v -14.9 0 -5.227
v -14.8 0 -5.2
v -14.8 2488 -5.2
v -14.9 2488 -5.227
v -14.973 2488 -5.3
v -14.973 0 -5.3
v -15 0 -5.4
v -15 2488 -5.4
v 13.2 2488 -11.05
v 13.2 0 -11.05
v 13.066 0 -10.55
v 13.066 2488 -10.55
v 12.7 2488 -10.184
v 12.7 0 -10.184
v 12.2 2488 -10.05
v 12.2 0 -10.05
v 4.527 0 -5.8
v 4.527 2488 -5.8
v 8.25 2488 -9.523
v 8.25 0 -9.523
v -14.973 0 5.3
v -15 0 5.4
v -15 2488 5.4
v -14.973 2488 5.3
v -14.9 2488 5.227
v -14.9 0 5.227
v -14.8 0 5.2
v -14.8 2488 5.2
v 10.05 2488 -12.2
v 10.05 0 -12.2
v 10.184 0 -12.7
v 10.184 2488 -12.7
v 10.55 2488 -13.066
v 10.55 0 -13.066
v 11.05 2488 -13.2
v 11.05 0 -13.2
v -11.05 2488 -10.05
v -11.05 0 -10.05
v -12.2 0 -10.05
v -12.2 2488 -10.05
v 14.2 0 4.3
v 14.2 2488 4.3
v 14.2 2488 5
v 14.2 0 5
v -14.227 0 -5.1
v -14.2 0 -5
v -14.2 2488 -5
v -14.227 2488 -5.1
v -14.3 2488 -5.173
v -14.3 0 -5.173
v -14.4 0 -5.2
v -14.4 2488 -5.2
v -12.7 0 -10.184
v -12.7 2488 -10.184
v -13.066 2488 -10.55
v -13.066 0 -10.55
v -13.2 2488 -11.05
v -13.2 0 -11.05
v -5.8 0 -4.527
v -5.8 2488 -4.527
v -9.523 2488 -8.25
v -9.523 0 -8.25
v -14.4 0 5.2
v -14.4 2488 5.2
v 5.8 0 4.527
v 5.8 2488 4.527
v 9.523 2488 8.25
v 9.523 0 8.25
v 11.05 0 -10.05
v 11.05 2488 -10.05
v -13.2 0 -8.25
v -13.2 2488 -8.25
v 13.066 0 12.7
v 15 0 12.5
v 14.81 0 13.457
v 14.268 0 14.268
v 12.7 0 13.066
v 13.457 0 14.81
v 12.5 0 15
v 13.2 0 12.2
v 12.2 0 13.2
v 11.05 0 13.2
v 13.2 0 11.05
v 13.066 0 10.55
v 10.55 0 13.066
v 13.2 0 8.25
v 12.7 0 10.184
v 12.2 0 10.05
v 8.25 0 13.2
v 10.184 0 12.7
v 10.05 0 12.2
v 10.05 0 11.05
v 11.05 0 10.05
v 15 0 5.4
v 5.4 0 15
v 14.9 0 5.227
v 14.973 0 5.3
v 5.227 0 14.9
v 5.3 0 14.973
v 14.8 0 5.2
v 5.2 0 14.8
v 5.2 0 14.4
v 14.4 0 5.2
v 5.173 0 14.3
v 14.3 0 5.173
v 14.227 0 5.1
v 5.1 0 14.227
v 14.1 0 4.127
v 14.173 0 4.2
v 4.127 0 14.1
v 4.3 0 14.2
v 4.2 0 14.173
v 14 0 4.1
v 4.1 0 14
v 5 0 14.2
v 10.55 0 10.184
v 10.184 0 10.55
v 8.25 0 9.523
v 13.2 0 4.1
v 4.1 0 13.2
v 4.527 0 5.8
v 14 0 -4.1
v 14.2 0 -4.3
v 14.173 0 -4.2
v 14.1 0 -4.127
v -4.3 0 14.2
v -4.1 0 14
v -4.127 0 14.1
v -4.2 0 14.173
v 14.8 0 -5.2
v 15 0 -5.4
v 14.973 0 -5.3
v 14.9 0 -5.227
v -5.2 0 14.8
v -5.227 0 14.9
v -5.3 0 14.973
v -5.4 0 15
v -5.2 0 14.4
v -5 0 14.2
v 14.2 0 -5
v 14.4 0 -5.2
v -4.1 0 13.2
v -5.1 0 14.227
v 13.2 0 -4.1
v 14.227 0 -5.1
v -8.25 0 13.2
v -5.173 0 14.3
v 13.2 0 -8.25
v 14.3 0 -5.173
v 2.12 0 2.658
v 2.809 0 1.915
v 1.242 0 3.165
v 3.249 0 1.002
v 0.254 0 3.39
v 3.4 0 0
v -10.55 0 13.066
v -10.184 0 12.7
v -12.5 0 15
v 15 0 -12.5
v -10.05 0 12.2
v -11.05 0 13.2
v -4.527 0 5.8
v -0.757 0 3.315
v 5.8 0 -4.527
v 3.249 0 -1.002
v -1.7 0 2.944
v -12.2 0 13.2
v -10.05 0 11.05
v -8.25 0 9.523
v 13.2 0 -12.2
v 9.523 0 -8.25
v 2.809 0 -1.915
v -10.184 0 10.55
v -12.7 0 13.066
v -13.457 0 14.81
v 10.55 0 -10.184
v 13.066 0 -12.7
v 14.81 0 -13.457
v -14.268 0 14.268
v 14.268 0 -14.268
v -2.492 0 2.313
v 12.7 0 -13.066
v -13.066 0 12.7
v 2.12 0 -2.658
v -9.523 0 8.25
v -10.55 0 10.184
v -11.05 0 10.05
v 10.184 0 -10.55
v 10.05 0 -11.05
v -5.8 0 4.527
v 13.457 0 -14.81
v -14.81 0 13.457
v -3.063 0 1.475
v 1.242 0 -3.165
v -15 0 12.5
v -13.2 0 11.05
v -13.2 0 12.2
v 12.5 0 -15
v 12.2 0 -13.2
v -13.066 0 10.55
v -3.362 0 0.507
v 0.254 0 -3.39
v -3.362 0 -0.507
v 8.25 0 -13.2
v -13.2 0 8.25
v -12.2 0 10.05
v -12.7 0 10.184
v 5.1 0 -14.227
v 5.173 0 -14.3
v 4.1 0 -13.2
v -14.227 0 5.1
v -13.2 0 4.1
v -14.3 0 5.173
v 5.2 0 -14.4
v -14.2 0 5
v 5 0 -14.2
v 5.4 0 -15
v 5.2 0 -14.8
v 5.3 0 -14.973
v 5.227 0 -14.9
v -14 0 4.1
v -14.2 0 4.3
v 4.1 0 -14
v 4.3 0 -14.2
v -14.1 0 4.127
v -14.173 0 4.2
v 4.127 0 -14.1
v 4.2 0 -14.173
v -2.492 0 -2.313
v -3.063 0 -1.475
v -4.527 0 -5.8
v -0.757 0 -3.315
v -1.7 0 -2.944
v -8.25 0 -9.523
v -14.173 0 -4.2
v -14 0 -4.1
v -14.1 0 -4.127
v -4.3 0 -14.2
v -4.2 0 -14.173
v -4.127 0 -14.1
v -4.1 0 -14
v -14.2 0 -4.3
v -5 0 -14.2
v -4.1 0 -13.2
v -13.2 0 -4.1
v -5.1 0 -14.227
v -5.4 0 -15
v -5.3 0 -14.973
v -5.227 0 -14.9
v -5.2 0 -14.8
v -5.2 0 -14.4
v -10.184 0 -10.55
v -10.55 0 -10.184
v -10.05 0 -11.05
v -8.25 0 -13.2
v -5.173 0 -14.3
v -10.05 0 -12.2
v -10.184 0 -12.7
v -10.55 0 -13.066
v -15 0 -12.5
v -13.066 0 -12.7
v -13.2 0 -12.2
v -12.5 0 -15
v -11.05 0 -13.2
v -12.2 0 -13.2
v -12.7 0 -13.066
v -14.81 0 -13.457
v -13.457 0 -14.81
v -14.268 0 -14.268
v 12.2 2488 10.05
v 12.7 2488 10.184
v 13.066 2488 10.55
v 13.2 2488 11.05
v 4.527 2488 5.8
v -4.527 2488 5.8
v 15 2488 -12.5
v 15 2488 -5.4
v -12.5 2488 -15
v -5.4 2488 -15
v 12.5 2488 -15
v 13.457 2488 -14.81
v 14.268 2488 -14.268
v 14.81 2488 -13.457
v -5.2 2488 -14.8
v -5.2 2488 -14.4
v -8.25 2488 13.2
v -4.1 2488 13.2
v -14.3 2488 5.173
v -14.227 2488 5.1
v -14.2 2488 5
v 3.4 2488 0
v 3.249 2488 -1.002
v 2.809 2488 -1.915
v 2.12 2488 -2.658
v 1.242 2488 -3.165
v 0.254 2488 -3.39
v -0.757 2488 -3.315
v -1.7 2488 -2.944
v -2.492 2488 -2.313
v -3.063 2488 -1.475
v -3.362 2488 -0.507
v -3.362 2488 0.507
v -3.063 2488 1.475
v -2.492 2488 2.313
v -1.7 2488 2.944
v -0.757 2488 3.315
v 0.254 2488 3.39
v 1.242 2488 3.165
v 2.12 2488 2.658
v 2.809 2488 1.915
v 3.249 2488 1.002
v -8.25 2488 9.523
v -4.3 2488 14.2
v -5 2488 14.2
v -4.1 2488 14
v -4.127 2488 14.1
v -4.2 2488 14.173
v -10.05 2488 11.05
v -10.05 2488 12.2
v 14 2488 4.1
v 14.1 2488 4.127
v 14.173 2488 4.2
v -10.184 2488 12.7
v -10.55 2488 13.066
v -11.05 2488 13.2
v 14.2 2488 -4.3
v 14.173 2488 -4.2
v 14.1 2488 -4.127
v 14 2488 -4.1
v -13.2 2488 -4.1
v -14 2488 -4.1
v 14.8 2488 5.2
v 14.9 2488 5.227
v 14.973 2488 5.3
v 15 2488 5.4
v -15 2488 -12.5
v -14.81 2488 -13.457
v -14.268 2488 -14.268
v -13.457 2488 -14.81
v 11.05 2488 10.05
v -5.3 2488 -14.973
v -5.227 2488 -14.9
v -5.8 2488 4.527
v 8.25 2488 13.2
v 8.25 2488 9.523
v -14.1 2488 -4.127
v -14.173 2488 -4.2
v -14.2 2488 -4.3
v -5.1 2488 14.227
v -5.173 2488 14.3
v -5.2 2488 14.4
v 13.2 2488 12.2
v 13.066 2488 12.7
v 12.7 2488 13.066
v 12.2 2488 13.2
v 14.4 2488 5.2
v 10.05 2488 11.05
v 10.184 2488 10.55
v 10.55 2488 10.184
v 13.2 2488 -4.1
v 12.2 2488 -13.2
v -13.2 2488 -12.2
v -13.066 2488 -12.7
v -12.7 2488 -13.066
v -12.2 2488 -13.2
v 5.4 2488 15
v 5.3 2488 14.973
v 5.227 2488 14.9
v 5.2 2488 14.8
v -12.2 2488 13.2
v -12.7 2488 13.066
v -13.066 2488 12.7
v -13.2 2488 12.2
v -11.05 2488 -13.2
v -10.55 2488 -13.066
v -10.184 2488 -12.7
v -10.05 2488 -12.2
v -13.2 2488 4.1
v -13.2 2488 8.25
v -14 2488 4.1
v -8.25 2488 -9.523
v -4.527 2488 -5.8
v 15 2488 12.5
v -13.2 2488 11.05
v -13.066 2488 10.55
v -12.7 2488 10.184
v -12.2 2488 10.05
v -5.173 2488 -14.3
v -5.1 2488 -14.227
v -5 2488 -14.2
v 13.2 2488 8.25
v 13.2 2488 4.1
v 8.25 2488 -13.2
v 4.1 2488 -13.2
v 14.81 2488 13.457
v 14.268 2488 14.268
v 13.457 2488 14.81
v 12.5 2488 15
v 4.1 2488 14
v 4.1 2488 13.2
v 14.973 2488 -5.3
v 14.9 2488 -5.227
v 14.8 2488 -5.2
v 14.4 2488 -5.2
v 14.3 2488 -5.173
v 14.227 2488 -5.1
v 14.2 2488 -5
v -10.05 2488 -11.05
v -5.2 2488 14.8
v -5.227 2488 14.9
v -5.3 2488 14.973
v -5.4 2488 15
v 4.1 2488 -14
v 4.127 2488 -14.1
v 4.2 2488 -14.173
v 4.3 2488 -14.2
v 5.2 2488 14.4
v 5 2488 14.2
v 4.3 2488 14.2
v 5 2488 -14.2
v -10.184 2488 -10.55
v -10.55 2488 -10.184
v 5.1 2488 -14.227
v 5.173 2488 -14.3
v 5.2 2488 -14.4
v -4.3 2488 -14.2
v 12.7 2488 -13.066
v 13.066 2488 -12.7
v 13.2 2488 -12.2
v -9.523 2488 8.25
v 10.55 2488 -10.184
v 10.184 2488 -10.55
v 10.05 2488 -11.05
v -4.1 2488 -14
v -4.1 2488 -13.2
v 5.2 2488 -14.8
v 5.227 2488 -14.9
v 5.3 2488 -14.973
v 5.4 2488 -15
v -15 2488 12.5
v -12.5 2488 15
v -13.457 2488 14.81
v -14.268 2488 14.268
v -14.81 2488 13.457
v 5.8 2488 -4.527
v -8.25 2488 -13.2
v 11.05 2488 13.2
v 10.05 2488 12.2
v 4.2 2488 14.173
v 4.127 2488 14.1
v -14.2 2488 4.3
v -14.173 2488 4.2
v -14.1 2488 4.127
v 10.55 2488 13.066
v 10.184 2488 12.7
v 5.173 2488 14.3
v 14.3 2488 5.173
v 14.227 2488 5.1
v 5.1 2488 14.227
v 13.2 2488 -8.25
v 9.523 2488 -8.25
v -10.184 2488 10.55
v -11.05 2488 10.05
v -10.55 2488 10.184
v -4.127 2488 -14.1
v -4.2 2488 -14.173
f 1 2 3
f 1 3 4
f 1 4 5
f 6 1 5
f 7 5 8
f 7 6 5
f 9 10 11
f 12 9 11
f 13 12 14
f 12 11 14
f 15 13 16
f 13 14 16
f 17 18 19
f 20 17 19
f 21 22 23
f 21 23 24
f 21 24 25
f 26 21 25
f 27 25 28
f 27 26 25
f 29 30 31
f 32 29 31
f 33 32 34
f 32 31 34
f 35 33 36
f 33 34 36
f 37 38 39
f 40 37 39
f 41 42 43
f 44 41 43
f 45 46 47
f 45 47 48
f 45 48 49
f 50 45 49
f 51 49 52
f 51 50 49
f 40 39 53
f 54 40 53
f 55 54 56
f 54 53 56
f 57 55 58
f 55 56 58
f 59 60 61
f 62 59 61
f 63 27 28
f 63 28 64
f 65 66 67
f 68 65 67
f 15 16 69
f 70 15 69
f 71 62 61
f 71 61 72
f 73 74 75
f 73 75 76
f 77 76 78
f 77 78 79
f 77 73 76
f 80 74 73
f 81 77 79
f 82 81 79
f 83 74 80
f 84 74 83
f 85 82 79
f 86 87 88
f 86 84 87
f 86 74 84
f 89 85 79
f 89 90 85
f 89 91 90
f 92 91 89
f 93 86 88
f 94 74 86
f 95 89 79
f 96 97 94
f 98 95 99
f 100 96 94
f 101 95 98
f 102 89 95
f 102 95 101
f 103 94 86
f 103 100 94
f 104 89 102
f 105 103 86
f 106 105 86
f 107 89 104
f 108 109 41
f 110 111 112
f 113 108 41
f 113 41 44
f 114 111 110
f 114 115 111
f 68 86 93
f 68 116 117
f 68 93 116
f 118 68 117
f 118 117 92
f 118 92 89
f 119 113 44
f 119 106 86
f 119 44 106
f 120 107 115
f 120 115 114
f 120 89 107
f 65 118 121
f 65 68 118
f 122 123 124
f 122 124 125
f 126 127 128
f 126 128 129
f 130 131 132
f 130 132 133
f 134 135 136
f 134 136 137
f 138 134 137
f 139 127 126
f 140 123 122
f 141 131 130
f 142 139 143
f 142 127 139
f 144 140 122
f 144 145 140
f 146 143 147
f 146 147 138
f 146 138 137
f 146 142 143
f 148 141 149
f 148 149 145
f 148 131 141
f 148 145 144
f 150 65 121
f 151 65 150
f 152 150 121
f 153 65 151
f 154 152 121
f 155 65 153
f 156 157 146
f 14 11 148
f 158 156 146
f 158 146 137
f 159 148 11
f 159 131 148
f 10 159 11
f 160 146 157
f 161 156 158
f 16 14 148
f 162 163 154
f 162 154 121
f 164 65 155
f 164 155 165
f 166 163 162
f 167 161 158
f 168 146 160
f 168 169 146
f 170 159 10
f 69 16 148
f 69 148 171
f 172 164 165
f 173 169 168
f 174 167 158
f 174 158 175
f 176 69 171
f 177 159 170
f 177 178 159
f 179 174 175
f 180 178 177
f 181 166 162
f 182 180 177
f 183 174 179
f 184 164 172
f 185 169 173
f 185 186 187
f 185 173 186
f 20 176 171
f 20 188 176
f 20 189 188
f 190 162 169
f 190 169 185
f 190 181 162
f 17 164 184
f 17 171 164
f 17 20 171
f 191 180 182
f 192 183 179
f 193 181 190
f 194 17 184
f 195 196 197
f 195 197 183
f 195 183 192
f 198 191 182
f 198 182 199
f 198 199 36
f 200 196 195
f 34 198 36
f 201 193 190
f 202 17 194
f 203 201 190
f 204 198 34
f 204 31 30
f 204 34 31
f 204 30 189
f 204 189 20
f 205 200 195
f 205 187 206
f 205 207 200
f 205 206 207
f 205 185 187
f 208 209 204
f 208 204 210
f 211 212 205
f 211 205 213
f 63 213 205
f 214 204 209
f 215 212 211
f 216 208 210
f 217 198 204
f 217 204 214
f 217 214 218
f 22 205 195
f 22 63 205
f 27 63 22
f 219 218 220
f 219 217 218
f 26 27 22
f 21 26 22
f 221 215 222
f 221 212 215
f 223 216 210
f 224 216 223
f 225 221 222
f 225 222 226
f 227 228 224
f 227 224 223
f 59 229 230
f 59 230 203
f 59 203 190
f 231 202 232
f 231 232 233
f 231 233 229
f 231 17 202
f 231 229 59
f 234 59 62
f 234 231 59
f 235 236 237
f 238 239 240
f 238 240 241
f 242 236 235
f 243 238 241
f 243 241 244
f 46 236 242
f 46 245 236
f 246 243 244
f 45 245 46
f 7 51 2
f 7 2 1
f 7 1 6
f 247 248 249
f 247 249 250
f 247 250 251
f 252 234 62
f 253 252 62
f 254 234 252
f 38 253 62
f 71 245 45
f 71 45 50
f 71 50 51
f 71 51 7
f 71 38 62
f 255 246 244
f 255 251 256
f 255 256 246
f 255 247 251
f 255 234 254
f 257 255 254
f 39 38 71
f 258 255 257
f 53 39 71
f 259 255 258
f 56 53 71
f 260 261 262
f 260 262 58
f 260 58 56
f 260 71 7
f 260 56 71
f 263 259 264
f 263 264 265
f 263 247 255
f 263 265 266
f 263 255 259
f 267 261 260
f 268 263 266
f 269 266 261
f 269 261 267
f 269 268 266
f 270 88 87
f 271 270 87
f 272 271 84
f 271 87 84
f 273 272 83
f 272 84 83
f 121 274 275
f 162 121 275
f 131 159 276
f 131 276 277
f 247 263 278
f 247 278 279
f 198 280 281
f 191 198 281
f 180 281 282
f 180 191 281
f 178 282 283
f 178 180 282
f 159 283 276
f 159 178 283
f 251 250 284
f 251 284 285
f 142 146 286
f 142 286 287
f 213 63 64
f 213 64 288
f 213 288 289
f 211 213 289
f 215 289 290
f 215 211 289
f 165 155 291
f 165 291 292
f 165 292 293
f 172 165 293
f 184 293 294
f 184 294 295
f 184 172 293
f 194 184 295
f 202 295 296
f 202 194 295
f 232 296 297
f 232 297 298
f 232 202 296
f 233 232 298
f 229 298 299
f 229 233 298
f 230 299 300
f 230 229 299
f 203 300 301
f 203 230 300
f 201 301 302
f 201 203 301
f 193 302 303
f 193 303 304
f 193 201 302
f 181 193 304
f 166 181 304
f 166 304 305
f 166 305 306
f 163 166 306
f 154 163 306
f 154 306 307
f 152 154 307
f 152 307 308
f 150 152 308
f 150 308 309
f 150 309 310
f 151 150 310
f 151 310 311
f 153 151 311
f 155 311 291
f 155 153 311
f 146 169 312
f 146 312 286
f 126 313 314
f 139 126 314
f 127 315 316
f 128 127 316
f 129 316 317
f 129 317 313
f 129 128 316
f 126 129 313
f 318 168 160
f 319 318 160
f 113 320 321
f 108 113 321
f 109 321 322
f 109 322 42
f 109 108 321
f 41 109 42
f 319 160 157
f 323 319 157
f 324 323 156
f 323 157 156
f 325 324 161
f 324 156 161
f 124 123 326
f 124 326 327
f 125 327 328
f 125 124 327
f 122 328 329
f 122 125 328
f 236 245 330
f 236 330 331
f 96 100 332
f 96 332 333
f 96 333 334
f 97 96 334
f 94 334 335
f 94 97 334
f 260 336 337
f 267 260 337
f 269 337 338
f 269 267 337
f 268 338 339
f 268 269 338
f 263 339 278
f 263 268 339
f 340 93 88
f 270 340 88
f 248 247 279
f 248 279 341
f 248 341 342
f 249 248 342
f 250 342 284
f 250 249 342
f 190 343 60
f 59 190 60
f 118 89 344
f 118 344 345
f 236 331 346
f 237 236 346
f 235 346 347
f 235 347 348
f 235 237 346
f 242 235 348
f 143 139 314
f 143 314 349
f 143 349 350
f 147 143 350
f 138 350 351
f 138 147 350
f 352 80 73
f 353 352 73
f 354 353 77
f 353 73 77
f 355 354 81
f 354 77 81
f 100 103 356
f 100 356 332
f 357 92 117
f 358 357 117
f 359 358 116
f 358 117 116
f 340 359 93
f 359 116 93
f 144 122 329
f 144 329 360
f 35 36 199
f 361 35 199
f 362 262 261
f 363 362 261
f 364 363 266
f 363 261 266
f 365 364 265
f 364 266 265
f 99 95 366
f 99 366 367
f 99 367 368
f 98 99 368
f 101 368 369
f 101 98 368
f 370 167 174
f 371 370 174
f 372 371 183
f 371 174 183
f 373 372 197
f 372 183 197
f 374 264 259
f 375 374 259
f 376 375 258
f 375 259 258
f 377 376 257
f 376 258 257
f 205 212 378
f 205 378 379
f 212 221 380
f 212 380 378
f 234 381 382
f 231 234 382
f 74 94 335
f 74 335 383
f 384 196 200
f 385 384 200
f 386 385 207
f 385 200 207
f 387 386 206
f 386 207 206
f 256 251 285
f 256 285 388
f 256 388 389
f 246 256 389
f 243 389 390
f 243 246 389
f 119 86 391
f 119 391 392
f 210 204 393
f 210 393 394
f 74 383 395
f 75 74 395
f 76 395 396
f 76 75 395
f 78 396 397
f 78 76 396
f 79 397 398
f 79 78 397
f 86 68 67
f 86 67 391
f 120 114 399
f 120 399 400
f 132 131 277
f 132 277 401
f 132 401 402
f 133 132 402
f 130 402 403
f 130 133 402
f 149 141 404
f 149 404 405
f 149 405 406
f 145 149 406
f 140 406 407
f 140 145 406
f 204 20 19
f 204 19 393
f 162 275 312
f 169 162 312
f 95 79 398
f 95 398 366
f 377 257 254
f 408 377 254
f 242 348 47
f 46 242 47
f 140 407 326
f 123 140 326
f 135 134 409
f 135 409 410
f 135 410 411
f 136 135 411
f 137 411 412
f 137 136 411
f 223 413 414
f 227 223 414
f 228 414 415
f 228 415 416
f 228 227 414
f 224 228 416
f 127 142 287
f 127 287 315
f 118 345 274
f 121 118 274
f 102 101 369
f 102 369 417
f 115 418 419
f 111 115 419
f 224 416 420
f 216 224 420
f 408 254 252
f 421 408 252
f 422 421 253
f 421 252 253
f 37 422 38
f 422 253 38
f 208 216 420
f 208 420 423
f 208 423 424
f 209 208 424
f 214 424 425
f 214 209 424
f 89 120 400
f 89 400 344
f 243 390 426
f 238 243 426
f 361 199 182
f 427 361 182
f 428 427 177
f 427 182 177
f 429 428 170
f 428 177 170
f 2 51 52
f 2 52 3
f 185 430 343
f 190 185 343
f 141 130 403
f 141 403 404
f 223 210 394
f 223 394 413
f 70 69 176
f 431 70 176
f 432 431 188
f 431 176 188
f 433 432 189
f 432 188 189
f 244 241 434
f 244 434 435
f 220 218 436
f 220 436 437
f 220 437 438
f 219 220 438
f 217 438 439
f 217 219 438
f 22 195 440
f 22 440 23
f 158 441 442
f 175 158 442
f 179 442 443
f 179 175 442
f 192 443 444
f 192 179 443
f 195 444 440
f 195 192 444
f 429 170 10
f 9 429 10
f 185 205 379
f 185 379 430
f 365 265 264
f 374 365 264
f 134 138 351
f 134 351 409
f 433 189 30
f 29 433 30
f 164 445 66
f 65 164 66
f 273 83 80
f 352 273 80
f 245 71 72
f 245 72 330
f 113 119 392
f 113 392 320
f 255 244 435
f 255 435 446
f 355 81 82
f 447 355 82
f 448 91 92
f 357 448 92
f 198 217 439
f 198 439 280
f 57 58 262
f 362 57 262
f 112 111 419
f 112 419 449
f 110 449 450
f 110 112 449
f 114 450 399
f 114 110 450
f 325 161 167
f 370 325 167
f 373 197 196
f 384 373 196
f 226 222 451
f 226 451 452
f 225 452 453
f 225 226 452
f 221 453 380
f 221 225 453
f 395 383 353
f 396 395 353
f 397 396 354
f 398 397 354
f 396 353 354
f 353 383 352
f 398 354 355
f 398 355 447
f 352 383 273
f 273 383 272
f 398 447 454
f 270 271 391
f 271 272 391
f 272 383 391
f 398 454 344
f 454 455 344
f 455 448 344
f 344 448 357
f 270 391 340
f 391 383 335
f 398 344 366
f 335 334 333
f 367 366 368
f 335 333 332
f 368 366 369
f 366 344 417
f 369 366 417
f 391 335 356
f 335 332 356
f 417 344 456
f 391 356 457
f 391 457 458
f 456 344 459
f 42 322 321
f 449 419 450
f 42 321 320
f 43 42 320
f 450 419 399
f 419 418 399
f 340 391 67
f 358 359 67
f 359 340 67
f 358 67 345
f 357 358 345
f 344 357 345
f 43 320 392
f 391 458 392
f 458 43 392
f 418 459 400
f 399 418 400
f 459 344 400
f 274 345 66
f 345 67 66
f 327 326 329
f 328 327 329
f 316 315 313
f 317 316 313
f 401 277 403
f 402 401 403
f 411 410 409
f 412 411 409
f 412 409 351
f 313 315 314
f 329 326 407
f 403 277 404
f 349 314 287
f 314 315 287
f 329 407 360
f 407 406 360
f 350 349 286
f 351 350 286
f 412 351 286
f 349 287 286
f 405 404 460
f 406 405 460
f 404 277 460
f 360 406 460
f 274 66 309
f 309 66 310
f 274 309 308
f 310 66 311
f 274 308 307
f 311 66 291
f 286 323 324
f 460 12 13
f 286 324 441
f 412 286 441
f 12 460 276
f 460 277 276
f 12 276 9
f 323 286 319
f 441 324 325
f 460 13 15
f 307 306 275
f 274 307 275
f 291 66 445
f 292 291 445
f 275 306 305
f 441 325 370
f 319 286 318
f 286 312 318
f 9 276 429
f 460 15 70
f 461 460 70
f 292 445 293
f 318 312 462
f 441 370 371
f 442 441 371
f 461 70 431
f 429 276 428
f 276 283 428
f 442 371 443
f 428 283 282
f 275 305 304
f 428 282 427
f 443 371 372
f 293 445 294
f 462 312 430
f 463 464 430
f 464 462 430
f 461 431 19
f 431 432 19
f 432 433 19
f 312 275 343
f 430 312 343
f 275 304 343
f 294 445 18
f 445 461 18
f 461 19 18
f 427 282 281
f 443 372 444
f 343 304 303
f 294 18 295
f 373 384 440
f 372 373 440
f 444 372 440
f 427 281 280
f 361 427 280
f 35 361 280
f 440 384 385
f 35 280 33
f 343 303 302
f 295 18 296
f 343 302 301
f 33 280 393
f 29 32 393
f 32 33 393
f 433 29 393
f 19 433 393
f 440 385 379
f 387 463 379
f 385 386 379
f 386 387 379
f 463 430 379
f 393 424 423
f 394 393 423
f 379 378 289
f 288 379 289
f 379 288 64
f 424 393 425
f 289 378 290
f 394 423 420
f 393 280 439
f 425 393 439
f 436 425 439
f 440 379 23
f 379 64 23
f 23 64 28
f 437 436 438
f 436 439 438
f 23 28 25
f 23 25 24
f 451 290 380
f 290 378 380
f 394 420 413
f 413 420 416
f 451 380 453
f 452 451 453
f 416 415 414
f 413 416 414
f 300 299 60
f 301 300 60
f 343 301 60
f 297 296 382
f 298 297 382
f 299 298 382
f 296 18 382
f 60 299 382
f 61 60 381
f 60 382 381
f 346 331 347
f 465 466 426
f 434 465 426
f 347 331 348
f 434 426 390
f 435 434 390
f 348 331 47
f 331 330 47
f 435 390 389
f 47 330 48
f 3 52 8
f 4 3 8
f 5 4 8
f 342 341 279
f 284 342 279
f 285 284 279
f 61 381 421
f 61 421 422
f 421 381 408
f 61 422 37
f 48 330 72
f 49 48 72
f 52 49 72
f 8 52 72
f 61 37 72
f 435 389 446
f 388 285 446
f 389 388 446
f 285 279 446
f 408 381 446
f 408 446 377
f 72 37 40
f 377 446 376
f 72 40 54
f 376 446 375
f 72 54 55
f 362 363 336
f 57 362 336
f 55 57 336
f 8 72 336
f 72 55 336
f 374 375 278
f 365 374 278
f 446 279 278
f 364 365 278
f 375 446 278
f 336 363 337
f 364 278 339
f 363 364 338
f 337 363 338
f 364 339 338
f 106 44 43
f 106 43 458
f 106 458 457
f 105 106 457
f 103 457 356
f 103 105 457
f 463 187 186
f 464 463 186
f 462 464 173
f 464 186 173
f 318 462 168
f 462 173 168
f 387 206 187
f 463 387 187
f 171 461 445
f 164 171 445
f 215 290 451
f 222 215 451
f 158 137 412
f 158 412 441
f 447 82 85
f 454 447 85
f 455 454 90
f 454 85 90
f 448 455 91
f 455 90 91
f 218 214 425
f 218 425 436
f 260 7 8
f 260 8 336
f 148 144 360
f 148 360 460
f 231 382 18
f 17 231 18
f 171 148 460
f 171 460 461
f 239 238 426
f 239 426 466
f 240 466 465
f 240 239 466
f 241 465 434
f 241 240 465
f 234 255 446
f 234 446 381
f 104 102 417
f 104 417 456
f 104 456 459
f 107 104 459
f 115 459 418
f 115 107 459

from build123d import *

# Parameters (mm, degrees)
SKETCH_3_R      = 3.4
EXTRUDE_1_DEPTH = 2488


with BuildPart() as part:
    # 草图3 → 凸台-拉伸1 (new body)
    with BuildSketch(Plane(origin=(0, 0, 0), x_dir=(1, 0, 0), z_dir=(0, 1, 0))):
        with BuildLine():
            Line((-15, -12.5), (-15, -5.4))
            ThreePointArc((-15, -5.4), (-14.941421356, -5.258578644), (-14.8, -5.2))
            Line((-14.8, -5.2), (-14.4, -5.2))
            ThreePointArc((-14.4, -5.2), (-14.258578644, -5.141421356), (-14.2, -5))
            Line((-14.2, -5), (-14.2, -4.3))
            ThreePointArc((-14.2, -4.3), (-14.141421356, -4.158578644), (-14, -4.1))
            Line((-14, -4.1), (-13.2, -4.1))
            Line((-13.2, -4.1), (-13.2, -8.25))
            Line((-13.2, -8.25), (-9.522792206, -8.25))
            Line((-9.522792206, -8.25), (-5.8, -4.527207794))
            Line((-5.8, -4.527207794), (-5.8, 4.527207794))
            Line((-5.8, 4.527207794), (-9.522792206, 8.25))
            Line((-9.522792206, 8.25), (-13.2, 8.25))
            Line((-13.2, 8.25), (-13.2, 4.1))
            Line((-13.2, 4.1), (-14, 4.1))
            ThreePointArc((-14, 4.1), (-14.141421356, 4.158578644), (-14.2, 4.3))
            Line((-14.2, 4.3), (-14.2, 5))
            ThreePointArc((-14.2, 5), (-14.258578644, 5.141421356), (-14.4, 5.2))
            Line((-14.4, 5.2), (-14.8, 5.2))
            ThreePointArc((-14.8, 5.2), (-14.941421356, 5.258578644), (-15, 5.4))
            Line((-15, 5.4), (-15, 12.5))
            ThreePointArc((-15, 12.5), (-14.267766953, 14.267766953), (-12.5, 15))
            Line((-12.5, 15), (-5.4, 15))
            ThreePointArc((-5.4, 15), (-5.258578644, 14.941421356), (-5.2, 14.8))
            Line((-5.2, 14.8), (-5.2, 14.4))
            ThreePointArc((-5.2, 14.4), (-5.141421356, 14.258578644), (-5, 14.2))
            Line((-5, 14.2), (-4.3, 14.2))
            ThreePointArc((-4.3, 14.2), (-4.158578644, 14.141421356), (-4.1, 14))
            Line((-4.1, 14), (-4.1, 13.2))
            Line((-4.1, 13.2), (-8.25, 13.2))
            Line((-8.25, 13.2), (-8.25, 9.522792206))
            Line((-8.25, 9.522792206), (-4.527207794, 5.8))
            Line((-4.527207794, 5.8), (4.527207794, 5.8))
            Line((4.527207794, 5.8), (8.25, 9.522792206))
            Line((8.25, 9.522792206), (8.25, 13.2))
            Line((8.25, 13.2), (4.1, 13.2))
            Line((4.1, 13.2), (4.1, 14))
            ThreePointArc((4.1, 14), (4.158578644, 14.141421356), (4.3, 14.2))
            Line((4.3, 14.2), (5, 14.2))
            ThreePointArc((5, 14.2), (5.141421356, 14.258578644), (5.2, 14.4))
            Line((5.2, 14.4), (5.2, 14.8))
            ThreePointArc((5.2, 14.8), (5.258578644, 14.941421356), (5.4, 15))
            Line((5.4, 15), (12.5, 15))
            ThreePointArc((12.5, 15), (14.267766953, 14.267766953), (15, 12.5))
            Line((15, 12.5), (15, 5.4))
            ThreePointArc((15, 5.4), (14.941421356, 5.258578644), (14.8, 5.2))
            Line((14.8, 5.2), (14.4, 5.2))
            ThreePointArc((14.4, 5.2), (14.258578644, 5.141421356), (14.2, 5))
            Line((14.2, 5), (14.2, 4.3))
            ThreePointArc((14.2, 4.3), (14.141421356, 4.158578644), (14, 4.1))
            Line((14, 4.1), (13.2, 4.1))
            Line((13.2, 4.1), (13.2, 8.25))
            Line((13.2, 8.25), (9.522792206, 8.25))
            Line((9.522792206, 8.25), (5.8, 4.527207794))
            Line((5.8, 4.527207794), (5.8, -4.527207794))
            Line((5.8, -4.527207794), (9.522792206, -8.25))
            Line((9.522792206, -8.25), (13.2, -8.25))
            Line((13.2, -8.25), (13.2, -4.1))
            Line((13.2, -4.1), (14, -4.1))
            ThreePointArc((14, -4.1), (14.141421356, -4.158578644), (14.2, -4.3))
            Line((14.2, -4.3), (14.2, -5))
            ThreePointArc((14.2, -5), (14.258578644, -5.141421356), (14.4, -5.2))
            Line((14.4, -5.2), (14.8, -5.2))
            ThreePointArc((14.8, -5.2), (14.941421356, -5.258578644), (15, -5.4))
            Line((15, -5.4), (15, -12.5))
            ThreePointArc((15, -12.5), (14.267766953, -14.267766953), (12.5, -15))
            Line((12.5, -15), (5.4, -15))
            ThreePointArc((5.4, -15), (5.258578644, -14.941421356), (5.2, -14.8))
            Line((5.2, -14.8), (5.2, -14.4))
            ThreePointArc((5.2, -14.4), (5.141421356, -14.258578644), (5, -14.2))
            Line((5, -14.2), (4.3, -14.2))
            ThreePointArc((4.3, -14.2), (4.158578644, -14.141421356), (4.1, -14))
            Line((4.1, -14), (4.1, -13.2))
            Line((4.1, -13.2), (8.25, -13.2))
            Line((8.25, -13.2), (8.25, -9.522792206))
            Line((8.25, -9.522792206), (4.527207794, -5.8))
            Line((4.527207794, -5.8), (-4.527207794, -5.8))
            Line((-4.527207794, -5.8), (-8.25, -9.522792206))
            Line((-8.25, -9.522792206), (-8.25, -13.2))
            Line((-8.25, -13.2), (-4.1, -13.2))
            Line((-4.1, -13.2), (-4.1, -14))
            ThreePointArc((-4.1, -14), (-4.158578644, -14.141421356), (-4.3, -14.2))
            Line((-4.3, -14.2), (-5, -14.2))
            ThreePointArc((-5, -14.2), (-5.141421356, -14.258578644), (-5.2, -14.4))
            Line((-5.2, -14.4), (-5.2, -14.8))
            ThreePointArc((-5.2, -14.8), (-5.258578644, -14.941421356), (-5.4, -15))
            Line((-5.4, -15), (-12.5, -15))
            ThreePointArc((-12.5, -15), (-14.267766953, -14.267766953), (-15, -12.5))
        make_face()
        Circle(SKETCH_3_R, mode=Mode.SUBTRACT)
        with BuildLine():
            Line((-13.2, -12.2), (-13.2, -11.05))
            ThreePointArc((-13.2, -11.05), (-12.907106781, -10.342893219), (-12.2, -10.05))
            Line((-12.2, -10.05), (-11.05, -10.05))
            ThreePointArc((-11.05, -10.05), (-10.342893219, -10.342893219), (-10.05, -11.05))
            Line((-10.05, -11.05), (-10.05, -12.2))
            ThreePointArc((-10.05, -12.2), (-10.342893219, -12.907106781), (-11.05, -13.2))
            Line((-11.05, -13.2), (-12.2, -13.2))
            ThreePointArc((-12.2, -13.2), (-12.907106781, -12.907106781), (-13.2, -12.2))
        make_face(mode=Mode.SUBTRACT)
        with BuildLine():
            Line((-10.05, 12.2), (-10.05, 11.05))
            ThreePointArc((-10.05, 11.05), (-10.342893219, 10.342893219), (-11.05, 10.05))
            Line((-11.05, 10.05), (-12.2, 10.05))
            ThreePointArc((-12.2, 10.05), (-12.907106781, 10.342893219), (-13.2, 11.05))
            Line((-13.2, 11.05), (-13.2, 12.2))
            ThreePointArc((-13.2, 12.2), (-12.907106781, 12.907106781), (-12.2, 13.2))
            Line((-12.2, 13.2), (-11.05, 13.2))
            ThreePointArc((-11.05, 13.2), (-10.342893219, 12.907106781), (-10.05, 12.2))
        make_face(mode=Mode.SUBTRACT)
        with BuildLine():
            Line((13.2, 12.2), (13.2, 11.05))
            ThreePointArc((13.2, 11.05), (12.907106781, 10.342893219), (12.2, 10.05))
            Line((12.2, 10.05), (11.05, 10.05))
            ThreePointArc((11.05, 10.05), (10.342893219, 10.342893219), (10.05, 11.05))
            Line((10.05, 11.05), (10.05, 12.2))
            ThreePointArc((10.05, 12.2), (10.342893219, 12.907106781), (11.05, 13.2))
            Line((11.05, 13.2), (12.2, 13.2))
            ThreePointArc((12.2, 13.2), (12.907106781, 12.907106781), (13.2, 12.2))
        make_face(mode=Mode.SUBTRACT)
        with BuildLine():
            Line((10.05, -12.2), (10.05, -11.05))
            ThreePointArc((10.05, -11.05), (10.342893219, -10.342893219), (11.05, -10.05))
            Line((11.05, -10.05), (12.2, -10.05))
            ThreePointArc((12.2, -10.05), (12.907106781, -10.342893219), (13.2, -11.05))
            Line((13.2, -11.05), (13.2, -12.2))
            ThreePointArc((13.2, -12.2), (12.907106781, -12.907106781), (12.2, -13.2))
            Line((12.2, -13.2), (11.05, -13.2))
            ThreePointArc((11.05, -13.2), (10.342893219, -12.907106781), (10.05, -12.2))
        make_face(mode=Mode.SUBTRACT)
    extrude(amount=EXTRUDE_1_DEPTH)


solid = part.part
